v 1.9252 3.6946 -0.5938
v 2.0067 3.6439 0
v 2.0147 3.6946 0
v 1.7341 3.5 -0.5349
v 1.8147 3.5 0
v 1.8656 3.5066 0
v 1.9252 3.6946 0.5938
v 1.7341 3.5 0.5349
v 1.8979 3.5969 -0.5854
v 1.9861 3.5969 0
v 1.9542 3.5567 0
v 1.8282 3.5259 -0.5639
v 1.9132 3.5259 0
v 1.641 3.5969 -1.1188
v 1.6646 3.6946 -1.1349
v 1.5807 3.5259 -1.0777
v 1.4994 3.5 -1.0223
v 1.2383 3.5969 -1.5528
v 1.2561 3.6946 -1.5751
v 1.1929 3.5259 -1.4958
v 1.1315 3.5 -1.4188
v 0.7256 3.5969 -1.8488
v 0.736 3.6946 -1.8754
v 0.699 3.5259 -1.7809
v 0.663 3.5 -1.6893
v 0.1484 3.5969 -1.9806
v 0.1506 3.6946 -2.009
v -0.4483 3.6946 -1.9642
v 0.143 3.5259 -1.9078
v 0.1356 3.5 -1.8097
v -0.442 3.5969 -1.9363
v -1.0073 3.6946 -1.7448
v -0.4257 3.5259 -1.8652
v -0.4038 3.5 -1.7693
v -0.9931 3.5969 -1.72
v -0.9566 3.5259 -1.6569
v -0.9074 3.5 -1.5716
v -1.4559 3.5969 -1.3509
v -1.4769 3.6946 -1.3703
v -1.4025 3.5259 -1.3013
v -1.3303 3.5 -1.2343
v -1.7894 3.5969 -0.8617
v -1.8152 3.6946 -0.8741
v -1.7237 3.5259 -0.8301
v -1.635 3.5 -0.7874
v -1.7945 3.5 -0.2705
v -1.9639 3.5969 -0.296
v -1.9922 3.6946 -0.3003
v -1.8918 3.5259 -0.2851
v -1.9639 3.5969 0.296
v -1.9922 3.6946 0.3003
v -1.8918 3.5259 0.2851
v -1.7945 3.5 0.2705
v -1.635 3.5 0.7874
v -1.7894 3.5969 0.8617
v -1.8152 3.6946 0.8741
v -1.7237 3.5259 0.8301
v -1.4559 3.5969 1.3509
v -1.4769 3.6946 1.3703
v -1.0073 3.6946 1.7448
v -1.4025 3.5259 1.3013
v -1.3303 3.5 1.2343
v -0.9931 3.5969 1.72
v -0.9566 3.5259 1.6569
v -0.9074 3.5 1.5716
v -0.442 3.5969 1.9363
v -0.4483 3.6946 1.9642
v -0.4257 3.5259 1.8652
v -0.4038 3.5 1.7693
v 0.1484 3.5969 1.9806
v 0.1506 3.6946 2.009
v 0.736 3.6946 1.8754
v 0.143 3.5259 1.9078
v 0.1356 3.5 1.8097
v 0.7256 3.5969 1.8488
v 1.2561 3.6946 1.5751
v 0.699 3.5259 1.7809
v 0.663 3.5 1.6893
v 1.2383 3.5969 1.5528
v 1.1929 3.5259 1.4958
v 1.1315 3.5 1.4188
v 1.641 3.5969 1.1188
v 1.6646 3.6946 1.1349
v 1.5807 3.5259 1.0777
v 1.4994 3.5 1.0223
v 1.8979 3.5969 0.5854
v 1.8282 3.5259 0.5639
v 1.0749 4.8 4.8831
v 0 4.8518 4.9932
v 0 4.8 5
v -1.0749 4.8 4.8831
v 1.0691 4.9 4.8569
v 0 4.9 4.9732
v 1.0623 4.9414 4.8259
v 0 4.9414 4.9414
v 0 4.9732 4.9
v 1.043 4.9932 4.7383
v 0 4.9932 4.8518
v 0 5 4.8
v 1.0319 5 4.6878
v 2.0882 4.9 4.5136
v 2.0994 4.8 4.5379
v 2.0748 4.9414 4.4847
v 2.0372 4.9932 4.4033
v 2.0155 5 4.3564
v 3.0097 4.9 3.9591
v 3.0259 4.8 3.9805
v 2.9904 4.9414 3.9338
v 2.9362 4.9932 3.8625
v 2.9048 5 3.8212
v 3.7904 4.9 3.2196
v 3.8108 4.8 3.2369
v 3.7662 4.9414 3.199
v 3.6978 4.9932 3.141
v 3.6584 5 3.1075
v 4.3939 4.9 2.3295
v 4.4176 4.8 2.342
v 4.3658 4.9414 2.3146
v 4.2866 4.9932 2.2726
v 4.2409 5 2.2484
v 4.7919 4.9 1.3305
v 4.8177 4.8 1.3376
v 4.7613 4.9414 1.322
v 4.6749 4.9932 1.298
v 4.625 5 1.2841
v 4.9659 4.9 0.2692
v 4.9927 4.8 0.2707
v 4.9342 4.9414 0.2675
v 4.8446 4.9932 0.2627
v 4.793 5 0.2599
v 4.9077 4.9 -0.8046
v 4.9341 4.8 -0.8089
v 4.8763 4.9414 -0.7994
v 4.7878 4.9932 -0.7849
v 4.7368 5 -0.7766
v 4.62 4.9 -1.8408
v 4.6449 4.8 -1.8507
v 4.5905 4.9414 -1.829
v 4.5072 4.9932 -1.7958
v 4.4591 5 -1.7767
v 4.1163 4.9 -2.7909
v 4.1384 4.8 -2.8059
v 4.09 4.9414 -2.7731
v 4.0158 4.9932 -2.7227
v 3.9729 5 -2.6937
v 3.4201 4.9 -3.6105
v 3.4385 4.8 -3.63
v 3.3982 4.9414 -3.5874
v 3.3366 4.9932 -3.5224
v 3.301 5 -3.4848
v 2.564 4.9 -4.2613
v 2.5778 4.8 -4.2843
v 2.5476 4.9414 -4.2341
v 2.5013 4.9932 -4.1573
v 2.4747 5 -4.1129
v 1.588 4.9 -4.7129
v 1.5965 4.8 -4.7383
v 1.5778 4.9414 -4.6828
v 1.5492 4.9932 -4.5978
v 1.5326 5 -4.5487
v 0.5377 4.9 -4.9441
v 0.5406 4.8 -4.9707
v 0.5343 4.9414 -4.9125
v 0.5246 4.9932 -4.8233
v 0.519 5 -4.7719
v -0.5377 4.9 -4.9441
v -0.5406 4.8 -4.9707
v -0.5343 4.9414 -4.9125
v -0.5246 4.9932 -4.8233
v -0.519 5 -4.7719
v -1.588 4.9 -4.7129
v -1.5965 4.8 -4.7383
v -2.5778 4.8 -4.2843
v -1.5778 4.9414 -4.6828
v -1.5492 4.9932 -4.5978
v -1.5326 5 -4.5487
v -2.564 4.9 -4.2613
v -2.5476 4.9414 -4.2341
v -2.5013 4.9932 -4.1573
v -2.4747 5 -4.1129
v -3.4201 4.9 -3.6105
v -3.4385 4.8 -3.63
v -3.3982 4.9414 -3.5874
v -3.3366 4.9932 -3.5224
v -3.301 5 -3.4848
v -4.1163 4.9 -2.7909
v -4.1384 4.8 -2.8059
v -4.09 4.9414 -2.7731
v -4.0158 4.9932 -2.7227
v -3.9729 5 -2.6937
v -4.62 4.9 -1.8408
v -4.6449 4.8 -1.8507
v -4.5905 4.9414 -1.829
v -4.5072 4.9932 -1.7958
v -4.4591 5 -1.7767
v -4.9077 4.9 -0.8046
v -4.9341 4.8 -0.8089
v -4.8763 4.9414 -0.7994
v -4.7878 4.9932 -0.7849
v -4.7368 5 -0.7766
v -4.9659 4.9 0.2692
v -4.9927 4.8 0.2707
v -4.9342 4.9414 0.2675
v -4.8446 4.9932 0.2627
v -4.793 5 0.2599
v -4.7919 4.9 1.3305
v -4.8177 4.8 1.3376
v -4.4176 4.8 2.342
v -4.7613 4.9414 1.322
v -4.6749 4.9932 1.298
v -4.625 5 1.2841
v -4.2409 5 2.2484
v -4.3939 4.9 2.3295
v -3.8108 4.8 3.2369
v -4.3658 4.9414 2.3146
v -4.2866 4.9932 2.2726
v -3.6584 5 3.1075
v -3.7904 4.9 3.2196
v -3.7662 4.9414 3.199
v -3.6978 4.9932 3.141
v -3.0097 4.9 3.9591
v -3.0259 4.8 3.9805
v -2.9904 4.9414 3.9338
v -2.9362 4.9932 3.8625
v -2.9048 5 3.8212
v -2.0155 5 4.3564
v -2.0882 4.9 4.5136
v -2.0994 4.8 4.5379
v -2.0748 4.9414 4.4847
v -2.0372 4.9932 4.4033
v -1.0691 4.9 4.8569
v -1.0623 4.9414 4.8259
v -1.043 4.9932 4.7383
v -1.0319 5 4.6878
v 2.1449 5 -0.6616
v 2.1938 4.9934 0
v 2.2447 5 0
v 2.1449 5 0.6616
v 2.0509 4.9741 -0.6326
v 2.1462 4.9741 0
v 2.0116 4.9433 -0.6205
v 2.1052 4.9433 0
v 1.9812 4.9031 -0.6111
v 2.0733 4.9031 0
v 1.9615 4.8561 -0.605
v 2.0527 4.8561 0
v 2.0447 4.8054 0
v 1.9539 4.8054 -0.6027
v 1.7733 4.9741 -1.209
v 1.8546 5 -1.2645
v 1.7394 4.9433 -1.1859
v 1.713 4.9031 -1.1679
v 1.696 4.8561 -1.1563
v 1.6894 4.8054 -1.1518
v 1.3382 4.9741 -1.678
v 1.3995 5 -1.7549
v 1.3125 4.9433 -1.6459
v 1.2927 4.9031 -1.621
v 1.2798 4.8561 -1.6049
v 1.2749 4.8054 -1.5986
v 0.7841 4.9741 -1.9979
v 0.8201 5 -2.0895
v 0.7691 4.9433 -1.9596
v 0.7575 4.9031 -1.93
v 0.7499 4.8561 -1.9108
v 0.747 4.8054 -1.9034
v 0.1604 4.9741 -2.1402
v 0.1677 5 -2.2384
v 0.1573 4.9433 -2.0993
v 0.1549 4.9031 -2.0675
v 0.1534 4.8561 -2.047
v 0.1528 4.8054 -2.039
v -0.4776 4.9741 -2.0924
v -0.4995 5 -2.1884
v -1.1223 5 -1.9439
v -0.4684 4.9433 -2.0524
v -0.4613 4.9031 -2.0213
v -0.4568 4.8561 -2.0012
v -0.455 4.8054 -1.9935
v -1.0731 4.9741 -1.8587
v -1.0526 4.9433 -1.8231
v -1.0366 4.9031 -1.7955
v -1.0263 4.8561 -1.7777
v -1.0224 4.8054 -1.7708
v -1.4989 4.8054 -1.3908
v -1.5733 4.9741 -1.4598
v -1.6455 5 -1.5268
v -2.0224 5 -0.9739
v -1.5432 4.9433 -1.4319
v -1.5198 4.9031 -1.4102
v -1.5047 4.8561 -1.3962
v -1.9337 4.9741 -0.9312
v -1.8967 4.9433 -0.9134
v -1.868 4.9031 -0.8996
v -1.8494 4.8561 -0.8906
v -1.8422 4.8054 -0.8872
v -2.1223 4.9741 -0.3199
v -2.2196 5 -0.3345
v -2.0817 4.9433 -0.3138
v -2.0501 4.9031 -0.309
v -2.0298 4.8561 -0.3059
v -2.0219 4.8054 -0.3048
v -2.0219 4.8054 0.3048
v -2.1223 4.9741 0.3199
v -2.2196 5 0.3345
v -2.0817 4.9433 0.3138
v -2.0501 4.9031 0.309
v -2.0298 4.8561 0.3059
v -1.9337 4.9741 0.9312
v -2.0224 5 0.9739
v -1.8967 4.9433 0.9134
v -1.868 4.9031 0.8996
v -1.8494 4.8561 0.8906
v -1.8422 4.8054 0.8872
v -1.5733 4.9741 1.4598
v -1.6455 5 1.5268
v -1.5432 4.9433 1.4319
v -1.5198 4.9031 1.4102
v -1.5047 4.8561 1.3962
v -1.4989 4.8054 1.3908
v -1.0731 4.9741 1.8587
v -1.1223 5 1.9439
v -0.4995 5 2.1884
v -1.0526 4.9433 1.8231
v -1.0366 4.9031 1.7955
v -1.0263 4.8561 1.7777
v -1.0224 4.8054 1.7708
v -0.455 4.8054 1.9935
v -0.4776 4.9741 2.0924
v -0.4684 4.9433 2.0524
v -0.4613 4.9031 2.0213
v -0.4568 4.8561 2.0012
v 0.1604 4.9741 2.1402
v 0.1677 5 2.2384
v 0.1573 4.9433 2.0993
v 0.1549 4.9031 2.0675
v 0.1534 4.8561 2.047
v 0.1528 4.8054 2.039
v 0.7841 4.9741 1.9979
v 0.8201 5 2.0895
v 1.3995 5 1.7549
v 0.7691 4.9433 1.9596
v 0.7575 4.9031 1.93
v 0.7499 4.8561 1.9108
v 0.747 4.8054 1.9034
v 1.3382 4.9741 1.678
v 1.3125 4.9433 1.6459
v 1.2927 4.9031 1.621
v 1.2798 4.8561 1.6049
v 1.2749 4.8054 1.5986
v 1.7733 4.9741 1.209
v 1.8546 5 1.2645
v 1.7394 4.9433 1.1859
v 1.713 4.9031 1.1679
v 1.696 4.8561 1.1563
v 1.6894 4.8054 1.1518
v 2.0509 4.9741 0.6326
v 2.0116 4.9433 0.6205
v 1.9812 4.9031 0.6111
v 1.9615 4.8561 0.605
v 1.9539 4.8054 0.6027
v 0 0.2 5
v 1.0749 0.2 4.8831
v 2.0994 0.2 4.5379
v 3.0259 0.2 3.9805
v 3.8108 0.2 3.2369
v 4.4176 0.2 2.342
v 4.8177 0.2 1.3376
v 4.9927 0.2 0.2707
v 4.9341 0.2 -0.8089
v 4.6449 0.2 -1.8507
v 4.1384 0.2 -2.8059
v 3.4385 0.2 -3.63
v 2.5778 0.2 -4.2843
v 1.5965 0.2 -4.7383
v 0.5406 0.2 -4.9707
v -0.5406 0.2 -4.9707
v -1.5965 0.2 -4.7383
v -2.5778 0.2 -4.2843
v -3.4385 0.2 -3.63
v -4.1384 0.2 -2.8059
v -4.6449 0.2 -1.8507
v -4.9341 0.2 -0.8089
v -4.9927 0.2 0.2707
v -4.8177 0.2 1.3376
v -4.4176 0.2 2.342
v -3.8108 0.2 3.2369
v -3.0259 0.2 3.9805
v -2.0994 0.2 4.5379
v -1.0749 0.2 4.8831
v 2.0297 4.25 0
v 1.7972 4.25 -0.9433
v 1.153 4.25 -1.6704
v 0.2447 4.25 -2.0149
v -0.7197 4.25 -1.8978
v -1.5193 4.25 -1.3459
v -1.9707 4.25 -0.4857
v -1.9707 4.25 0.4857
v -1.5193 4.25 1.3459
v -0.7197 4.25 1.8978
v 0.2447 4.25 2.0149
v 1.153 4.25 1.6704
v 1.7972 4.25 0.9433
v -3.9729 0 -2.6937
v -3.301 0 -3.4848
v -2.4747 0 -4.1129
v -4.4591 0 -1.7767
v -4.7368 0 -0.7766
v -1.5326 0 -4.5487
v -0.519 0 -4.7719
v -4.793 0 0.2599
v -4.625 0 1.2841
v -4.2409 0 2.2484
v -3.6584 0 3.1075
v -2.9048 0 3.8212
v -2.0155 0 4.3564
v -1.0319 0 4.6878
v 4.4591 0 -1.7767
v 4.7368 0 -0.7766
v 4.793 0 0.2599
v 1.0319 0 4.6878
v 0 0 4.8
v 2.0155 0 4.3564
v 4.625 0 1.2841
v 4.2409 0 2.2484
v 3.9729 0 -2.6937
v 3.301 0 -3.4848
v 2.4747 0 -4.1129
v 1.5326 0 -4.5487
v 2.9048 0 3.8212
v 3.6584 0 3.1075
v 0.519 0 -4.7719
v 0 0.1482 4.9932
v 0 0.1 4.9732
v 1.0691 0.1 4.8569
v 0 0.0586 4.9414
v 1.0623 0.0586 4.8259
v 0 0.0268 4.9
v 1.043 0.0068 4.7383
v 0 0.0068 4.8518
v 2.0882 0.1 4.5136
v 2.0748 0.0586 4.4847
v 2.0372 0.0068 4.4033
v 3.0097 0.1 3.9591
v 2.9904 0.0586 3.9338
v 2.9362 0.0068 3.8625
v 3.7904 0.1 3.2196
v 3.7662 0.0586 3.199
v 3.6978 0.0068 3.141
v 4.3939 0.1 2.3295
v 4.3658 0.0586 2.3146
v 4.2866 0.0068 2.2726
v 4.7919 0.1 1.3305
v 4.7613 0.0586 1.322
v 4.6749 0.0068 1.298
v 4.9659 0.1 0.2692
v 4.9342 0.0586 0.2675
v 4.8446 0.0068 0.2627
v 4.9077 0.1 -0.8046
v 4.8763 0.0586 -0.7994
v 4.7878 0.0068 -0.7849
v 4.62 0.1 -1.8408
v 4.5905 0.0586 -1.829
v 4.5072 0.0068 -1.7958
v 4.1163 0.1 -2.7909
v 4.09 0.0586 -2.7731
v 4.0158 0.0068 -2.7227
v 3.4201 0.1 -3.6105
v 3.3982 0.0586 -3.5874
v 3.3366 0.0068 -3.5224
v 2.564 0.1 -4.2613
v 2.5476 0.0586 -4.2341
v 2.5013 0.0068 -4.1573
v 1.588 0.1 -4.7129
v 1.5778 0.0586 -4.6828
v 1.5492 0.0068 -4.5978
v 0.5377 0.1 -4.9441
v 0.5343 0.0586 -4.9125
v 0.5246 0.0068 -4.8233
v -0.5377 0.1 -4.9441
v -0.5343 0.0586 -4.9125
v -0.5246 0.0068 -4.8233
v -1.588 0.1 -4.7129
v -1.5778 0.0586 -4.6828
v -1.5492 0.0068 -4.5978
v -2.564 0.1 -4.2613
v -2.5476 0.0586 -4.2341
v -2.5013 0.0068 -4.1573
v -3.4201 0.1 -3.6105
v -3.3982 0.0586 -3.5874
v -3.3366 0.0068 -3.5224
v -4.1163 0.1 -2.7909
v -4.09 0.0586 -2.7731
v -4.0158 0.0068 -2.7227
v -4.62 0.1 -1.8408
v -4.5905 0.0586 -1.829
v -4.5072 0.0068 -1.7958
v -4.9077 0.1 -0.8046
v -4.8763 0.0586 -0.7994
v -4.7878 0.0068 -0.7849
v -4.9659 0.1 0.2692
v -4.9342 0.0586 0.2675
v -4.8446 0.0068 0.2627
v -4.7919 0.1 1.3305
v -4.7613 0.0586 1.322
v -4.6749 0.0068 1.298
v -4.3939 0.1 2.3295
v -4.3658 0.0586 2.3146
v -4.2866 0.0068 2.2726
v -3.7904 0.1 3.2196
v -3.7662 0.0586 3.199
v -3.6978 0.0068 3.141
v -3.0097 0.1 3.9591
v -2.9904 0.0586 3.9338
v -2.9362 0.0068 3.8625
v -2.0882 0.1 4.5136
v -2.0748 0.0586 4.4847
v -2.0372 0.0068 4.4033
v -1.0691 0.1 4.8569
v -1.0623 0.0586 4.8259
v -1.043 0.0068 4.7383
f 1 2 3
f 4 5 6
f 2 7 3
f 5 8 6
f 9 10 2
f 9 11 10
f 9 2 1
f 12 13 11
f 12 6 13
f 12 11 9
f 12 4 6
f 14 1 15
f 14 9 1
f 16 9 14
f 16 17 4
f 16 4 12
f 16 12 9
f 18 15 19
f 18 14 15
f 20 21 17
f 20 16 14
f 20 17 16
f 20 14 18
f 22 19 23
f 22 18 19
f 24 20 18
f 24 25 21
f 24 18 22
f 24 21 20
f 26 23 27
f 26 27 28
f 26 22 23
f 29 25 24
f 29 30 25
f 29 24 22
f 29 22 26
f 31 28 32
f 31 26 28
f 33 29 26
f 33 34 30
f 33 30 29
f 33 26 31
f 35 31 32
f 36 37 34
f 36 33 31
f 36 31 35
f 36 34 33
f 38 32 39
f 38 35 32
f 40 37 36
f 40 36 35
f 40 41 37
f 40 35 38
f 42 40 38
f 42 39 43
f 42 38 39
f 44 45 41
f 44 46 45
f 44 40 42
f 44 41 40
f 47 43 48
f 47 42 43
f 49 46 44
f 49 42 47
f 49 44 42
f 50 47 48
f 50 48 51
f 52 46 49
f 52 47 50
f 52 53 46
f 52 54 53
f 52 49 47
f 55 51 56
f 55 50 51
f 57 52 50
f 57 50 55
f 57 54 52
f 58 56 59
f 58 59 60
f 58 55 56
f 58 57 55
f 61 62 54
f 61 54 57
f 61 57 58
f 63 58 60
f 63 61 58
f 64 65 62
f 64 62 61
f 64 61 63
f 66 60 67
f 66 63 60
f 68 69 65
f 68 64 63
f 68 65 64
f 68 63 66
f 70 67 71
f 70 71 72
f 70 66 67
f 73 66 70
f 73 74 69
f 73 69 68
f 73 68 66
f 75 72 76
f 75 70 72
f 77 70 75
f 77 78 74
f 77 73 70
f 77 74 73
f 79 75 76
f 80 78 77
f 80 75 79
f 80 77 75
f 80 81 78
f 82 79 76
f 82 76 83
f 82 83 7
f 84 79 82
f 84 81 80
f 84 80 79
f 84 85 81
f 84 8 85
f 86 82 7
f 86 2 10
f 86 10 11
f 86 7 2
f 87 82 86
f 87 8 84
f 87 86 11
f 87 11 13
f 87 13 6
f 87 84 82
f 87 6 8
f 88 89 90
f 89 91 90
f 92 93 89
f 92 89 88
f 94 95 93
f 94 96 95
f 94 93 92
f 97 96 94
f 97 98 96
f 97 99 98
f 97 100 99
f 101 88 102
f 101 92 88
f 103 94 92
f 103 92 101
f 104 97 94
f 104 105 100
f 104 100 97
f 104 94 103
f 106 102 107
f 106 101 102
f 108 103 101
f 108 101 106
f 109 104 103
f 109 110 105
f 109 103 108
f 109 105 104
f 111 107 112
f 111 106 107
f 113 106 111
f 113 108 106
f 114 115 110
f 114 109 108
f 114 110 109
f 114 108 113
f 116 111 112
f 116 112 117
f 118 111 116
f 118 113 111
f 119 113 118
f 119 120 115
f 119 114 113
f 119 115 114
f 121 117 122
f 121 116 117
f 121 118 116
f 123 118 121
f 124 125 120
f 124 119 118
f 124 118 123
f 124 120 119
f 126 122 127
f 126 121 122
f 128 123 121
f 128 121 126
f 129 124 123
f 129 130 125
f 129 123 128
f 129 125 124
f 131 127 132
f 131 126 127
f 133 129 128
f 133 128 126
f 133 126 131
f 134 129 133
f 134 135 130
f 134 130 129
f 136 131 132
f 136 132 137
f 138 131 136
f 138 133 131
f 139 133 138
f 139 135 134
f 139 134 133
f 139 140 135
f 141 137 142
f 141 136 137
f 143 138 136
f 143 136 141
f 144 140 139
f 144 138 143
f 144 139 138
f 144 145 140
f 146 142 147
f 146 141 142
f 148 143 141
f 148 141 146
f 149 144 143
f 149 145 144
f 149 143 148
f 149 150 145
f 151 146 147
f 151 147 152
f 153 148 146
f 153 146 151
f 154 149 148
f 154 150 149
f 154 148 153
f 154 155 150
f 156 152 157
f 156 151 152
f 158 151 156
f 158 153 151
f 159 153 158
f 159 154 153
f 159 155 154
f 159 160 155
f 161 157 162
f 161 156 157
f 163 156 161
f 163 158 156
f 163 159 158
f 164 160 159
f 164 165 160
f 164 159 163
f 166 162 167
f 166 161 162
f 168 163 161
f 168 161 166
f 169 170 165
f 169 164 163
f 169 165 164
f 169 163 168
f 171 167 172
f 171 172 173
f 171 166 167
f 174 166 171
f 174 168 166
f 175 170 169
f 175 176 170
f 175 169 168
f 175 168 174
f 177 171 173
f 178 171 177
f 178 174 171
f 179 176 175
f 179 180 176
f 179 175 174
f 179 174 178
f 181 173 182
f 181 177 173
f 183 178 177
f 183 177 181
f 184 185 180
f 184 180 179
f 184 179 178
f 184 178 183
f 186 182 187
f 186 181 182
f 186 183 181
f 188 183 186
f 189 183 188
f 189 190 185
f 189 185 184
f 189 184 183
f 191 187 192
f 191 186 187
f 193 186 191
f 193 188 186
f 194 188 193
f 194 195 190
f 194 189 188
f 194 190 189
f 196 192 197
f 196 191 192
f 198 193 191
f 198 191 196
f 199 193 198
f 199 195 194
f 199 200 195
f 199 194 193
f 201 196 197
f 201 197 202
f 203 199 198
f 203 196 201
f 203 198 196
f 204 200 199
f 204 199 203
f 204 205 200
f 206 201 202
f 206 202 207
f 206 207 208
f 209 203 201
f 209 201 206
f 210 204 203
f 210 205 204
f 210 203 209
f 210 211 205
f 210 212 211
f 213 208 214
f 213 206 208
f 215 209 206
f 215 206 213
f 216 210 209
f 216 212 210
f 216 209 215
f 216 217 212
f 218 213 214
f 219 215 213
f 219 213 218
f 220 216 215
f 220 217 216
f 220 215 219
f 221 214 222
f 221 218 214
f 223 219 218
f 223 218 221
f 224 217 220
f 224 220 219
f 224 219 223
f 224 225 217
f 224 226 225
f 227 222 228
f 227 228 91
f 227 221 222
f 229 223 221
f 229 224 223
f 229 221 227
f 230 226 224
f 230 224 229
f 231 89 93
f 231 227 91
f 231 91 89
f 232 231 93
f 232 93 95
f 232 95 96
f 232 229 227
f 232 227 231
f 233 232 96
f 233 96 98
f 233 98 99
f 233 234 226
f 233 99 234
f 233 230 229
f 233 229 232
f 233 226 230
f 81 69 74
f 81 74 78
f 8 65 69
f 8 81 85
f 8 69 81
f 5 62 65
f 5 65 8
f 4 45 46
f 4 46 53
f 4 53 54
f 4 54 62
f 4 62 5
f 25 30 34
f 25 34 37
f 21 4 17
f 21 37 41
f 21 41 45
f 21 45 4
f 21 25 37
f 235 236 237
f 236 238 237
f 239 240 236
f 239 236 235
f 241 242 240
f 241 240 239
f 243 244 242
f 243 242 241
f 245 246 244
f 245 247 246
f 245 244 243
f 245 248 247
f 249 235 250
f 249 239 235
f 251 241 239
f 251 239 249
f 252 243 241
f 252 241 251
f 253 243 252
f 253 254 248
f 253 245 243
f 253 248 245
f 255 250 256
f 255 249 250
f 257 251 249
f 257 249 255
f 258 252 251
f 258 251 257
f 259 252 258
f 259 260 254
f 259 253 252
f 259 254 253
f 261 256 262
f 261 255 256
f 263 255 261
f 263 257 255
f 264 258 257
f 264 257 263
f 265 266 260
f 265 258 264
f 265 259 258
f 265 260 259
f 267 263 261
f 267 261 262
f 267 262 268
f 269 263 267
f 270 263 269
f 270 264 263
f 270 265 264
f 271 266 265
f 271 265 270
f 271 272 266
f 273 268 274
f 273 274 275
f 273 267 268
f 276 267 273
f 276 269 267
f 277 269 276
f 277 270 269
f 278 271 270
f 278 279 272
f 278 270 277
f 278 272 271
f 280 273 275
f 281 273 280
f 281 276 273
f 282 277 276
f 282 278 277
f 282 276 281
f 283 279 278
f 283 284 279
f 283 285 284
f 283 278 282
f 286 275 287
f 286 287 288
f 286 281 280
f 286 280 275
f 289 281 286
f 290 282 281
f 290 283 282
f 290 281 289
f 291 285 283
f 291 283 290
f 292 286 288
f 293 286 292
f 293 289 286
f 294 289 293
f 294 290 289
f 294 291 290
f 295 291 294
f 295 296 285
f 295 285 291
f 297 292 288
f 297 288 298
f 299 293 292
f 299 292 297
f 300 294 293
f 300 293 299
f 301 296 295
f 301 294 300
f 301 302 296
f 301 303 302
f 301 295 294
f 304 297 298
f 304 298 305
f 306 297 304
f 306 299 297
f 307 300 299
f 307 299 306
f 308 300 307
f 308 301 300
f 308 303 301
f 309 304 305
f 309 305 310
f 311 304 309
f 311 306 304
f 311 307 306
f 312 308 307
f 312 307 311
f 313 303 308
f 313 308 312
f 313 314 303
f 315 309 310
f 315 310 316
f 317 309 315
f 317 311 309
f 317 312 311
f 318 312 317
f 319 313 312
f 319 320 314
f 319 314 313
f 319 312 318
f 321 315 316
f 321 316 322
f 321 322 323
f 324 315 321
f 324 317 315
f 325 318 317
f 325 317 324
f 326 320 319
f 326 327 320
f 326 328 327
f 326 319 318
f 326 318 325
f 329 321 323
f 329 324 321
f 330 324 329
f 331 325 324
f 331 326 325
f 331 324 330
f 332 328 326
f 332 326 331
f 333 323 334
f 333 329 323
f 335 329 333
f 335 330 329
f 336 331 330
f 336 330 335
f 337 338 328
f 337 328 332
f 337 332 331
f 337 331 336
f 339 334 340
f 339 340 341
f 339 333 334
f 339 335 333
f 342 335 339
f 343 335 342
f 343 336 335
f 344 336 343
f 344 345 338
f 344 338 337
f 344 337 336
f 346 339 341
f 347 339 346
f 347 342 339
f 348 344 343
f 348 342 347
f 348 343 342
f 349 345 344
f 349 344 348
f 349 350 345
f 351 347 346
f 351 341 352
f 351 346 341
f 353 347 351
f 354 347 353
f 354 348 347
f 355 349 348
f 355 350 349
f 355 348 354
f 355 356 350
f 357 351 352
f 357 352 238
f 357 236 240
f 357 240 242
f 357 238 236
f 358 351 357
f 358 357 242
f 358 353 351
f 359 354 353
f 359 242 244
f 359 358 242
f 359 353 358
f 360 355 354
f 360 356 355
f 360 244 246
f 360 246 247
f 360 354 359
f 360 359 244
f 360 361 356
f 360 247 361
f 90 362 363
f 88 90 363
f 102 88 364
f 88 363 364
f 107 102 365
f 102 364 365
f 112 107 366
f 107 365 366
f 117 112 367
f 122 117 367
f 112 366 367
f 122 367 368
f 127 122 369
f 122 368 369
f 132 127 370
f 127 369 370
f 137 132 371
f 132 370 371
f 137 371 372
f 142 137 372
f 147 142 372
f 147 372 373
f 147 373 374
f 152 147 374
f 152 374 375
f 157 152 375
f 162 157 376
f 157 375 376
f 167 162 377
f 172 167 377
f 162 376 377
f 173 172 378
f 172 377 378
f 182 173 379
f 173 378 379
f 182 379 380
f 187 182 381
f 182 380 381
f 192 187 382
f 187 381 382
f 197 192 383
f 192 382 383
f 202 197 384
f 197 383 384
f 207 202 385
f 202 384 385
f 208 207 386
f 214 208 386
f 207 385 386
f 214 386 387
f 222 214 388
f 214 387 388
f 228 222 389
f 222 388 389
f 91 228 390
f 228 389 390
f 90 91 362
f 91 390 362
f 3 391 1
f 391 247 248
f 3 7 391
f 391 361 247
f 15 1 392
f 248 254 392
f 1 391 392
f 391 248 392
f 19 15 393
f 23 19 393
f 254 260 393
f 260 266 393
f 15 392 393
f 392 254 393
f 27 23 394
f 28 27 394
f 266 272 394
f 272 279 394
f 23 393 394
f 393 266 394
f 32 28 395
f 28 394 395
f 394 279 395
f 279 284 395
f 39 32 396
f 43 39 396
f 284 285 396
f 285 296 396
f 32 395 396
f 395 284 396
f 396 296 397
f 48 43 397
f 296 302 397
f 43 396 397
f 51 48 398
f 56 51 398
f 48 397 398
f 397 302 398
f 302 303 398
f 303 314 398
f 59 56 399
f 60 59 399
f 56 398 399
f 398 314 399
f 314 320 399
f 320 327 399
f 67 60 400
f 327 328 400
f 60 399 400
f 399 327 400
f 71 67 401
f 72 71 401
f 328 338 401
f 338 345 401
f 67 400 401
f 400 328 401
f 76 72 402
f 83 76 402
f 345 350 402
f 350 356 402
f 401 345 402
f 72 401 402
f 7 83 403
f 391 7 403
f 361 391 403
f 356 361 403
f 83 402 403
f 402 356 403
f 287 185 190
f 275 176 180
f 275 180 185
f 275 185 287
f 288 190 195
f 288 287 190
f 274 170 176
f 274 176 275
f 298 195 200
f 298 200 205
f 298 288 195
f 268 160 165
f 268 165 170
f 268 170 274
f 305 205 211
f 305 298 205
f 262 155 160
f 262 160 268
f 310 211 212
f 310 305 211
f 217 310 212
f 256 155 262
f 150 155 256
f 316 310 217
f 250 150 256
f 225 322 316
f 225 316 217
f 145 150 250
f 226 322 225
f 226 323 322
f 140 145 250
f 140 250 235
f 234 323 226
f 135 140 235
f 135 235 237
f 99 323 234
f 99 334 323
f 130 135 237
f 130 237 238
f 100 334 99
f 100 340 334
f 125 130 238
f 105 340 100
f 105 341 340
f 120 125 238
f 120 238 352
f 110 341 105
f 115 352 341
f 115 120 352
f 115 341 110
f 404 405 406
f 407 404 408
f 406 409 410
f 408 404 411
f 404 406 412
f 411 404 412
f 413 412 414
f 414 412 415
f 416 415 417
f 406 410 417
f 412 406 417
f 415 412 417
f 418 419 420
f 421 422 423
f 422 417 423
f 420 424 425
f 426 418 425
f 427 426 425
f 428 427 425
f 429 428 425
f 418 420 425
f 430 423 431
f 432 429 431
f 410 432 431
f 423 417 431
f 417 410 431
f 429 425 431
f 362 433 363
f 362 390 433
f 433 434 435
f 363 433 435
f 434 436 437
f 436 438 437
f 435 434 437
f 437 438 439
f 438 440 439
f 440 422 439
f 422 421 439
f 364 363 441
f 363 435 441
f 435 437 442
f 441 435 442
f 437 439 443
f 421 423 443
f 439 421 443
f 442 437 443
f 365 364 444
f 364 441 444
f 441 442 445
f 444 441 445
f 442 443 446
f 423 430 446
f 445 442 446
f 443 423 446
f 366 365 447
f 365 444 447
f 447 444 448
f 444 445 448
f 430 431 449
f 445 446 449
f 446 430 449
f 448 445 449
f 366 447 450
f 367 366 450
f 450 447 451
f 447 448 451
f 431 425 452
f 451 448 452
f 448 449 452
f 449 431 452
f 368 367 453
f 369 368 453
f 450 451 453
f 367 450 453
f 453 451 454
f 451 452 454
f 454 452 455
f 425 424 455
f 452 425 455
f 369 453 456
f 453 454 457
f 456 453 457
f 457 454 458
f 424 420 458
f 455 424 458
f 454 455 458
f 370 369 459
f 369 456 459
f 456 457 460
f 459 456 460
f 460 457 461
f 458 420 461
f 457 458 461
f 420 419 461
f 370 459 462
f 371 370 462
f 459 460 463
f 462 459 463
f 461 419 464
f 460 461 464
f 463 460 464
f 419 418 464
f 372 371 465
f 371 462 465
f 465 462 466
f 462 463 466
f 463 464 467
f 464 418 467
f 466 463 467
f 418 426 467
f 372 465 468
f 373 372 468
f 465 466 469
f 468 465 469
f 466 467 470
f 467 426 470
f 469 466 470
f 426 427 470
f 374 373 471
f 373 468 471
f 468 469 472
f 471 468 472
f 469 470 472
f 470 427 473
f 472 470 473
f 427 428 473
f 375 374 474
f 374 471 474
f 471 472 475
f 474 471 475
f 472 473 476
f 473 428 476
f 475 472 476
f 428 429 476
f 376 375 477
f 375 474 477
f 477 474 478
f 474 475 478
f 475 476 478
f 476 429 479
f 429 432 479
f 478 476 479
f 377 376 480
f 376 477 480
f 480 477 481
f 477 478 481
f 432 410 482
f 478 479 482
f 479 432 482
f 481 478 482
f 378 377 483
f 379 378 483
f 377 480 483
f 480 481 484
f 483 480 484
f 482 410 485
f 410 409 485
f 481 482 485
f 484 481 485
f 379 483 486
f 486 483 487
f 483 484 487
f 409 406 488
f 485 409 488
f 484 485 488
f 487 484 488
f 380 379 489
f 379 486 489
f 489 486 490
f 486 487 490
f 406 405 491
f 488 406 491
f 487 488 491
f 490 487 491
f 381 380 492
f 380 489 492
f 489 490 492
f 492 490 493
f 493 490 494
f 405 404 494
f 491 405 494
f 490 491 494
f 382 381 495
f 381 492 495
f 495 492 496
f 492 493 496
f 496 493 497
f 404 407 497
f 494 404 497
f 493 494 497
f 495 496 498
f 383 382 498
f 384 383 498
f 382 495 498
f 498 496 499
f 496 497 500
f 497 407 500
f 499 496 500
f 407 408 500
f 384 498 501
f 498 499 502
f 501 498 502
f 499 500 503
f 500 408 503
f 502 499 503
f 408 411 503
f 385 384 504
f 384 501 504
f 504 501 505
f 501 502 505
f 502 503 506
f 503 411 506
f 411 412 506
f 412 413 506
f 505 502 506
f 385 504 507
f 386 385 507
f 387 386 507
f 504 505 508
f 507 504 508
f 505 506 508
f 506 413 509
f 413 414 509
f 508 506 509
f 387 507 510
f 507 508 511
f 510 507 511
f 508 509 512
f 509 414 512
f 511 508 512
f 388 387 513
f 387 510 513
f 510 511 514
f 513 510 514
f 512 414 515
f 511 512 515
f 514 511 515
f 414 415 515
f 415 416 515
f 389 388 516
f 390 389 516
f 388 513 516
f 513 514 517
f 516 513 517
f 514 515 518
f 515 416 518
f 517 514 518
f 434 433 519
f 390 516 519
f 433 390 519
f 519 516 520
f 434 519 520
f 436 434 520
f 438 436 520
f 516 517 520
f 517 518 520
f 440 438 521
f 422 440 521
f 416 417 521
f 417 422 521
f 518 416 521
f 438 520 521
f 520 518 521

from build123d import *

# Parameters (mm, degrees)
SKETCH1_R           = 5
BOSS_EXTRUDE1_DEPTH = 5
SKETCH2_R           = 2.05
CUT_EXTRUDE1_DEPTH  = 1.5
CUT_EXTRUDE1_DRAFT  = -1.55
FILLET1_R           = 0.2
FILLET2_R           = 0.2


with BuildPart() as part:
    # Sketch1 → Boss-Extrude1 (new body)
    with BuildSketch(Plane(origin=(0, 0, 0), x_dir=(1, 0, 0), z_dir=(0, 1, 0))):
        Circle(SKETCH1_R)
    extrude(amount=BOSS_EXTRUDE1_DEPTH)


with BuildPart() as cut_extrude1_tool:
    # Sketch2 → Cut-Extrude1 (with draft: the straight prism first)
    with BuildSketch(Plane(origin=(0, 5, 0), x_dir=(1, 0, 0), z_dir=(0, 1, 0))):
        Circle(SKETCH2_R)
    extrude(amount=-CUT_EXTRUDE1_DEPTH)
    # Cut-Extrude1: the draft: its side faces are tilted about the plane it starts from
    cut_extrude1_sides = [cut_extrude1_tool.faces().sort_by_distance(p)[0] for p in [
        (-2.05, 4.25, 0),
    ]]
    draft(cut_extrude1_sides, Plane(origin=(0, 5, 0), x_dir=(1, 0, 0), z_dir=(0, 1, 0)), CUT_EXTRUDE1_DRAFT)


with BuildPart() as part_1:
    add(part.part)

    # Cut-Extrude1: cut by cut_extrude1_tool
    add(cut_extrude1_tool.part, mode=Mode.SUBTRACT)

    # Fillet1
    fillet1_edges = [part_1.edges().sort_by_distance(p)[0] for p in [
        (-5, 0, 0),
        (-5, 5, 0),
        (-2.05, 5, 0),
    ]]
    fillet(fillet1_edges, radius=FILLET1_R)

    # Fillet2
    fillet2_edges = [part_1.edges().sort_by_distance(p)[0] for p in [
        (-2.009411193, 3.5, 0),
    ]]
    fillet(fillet2_edges, radius=FILLET2_R)


solid = part_1.part
